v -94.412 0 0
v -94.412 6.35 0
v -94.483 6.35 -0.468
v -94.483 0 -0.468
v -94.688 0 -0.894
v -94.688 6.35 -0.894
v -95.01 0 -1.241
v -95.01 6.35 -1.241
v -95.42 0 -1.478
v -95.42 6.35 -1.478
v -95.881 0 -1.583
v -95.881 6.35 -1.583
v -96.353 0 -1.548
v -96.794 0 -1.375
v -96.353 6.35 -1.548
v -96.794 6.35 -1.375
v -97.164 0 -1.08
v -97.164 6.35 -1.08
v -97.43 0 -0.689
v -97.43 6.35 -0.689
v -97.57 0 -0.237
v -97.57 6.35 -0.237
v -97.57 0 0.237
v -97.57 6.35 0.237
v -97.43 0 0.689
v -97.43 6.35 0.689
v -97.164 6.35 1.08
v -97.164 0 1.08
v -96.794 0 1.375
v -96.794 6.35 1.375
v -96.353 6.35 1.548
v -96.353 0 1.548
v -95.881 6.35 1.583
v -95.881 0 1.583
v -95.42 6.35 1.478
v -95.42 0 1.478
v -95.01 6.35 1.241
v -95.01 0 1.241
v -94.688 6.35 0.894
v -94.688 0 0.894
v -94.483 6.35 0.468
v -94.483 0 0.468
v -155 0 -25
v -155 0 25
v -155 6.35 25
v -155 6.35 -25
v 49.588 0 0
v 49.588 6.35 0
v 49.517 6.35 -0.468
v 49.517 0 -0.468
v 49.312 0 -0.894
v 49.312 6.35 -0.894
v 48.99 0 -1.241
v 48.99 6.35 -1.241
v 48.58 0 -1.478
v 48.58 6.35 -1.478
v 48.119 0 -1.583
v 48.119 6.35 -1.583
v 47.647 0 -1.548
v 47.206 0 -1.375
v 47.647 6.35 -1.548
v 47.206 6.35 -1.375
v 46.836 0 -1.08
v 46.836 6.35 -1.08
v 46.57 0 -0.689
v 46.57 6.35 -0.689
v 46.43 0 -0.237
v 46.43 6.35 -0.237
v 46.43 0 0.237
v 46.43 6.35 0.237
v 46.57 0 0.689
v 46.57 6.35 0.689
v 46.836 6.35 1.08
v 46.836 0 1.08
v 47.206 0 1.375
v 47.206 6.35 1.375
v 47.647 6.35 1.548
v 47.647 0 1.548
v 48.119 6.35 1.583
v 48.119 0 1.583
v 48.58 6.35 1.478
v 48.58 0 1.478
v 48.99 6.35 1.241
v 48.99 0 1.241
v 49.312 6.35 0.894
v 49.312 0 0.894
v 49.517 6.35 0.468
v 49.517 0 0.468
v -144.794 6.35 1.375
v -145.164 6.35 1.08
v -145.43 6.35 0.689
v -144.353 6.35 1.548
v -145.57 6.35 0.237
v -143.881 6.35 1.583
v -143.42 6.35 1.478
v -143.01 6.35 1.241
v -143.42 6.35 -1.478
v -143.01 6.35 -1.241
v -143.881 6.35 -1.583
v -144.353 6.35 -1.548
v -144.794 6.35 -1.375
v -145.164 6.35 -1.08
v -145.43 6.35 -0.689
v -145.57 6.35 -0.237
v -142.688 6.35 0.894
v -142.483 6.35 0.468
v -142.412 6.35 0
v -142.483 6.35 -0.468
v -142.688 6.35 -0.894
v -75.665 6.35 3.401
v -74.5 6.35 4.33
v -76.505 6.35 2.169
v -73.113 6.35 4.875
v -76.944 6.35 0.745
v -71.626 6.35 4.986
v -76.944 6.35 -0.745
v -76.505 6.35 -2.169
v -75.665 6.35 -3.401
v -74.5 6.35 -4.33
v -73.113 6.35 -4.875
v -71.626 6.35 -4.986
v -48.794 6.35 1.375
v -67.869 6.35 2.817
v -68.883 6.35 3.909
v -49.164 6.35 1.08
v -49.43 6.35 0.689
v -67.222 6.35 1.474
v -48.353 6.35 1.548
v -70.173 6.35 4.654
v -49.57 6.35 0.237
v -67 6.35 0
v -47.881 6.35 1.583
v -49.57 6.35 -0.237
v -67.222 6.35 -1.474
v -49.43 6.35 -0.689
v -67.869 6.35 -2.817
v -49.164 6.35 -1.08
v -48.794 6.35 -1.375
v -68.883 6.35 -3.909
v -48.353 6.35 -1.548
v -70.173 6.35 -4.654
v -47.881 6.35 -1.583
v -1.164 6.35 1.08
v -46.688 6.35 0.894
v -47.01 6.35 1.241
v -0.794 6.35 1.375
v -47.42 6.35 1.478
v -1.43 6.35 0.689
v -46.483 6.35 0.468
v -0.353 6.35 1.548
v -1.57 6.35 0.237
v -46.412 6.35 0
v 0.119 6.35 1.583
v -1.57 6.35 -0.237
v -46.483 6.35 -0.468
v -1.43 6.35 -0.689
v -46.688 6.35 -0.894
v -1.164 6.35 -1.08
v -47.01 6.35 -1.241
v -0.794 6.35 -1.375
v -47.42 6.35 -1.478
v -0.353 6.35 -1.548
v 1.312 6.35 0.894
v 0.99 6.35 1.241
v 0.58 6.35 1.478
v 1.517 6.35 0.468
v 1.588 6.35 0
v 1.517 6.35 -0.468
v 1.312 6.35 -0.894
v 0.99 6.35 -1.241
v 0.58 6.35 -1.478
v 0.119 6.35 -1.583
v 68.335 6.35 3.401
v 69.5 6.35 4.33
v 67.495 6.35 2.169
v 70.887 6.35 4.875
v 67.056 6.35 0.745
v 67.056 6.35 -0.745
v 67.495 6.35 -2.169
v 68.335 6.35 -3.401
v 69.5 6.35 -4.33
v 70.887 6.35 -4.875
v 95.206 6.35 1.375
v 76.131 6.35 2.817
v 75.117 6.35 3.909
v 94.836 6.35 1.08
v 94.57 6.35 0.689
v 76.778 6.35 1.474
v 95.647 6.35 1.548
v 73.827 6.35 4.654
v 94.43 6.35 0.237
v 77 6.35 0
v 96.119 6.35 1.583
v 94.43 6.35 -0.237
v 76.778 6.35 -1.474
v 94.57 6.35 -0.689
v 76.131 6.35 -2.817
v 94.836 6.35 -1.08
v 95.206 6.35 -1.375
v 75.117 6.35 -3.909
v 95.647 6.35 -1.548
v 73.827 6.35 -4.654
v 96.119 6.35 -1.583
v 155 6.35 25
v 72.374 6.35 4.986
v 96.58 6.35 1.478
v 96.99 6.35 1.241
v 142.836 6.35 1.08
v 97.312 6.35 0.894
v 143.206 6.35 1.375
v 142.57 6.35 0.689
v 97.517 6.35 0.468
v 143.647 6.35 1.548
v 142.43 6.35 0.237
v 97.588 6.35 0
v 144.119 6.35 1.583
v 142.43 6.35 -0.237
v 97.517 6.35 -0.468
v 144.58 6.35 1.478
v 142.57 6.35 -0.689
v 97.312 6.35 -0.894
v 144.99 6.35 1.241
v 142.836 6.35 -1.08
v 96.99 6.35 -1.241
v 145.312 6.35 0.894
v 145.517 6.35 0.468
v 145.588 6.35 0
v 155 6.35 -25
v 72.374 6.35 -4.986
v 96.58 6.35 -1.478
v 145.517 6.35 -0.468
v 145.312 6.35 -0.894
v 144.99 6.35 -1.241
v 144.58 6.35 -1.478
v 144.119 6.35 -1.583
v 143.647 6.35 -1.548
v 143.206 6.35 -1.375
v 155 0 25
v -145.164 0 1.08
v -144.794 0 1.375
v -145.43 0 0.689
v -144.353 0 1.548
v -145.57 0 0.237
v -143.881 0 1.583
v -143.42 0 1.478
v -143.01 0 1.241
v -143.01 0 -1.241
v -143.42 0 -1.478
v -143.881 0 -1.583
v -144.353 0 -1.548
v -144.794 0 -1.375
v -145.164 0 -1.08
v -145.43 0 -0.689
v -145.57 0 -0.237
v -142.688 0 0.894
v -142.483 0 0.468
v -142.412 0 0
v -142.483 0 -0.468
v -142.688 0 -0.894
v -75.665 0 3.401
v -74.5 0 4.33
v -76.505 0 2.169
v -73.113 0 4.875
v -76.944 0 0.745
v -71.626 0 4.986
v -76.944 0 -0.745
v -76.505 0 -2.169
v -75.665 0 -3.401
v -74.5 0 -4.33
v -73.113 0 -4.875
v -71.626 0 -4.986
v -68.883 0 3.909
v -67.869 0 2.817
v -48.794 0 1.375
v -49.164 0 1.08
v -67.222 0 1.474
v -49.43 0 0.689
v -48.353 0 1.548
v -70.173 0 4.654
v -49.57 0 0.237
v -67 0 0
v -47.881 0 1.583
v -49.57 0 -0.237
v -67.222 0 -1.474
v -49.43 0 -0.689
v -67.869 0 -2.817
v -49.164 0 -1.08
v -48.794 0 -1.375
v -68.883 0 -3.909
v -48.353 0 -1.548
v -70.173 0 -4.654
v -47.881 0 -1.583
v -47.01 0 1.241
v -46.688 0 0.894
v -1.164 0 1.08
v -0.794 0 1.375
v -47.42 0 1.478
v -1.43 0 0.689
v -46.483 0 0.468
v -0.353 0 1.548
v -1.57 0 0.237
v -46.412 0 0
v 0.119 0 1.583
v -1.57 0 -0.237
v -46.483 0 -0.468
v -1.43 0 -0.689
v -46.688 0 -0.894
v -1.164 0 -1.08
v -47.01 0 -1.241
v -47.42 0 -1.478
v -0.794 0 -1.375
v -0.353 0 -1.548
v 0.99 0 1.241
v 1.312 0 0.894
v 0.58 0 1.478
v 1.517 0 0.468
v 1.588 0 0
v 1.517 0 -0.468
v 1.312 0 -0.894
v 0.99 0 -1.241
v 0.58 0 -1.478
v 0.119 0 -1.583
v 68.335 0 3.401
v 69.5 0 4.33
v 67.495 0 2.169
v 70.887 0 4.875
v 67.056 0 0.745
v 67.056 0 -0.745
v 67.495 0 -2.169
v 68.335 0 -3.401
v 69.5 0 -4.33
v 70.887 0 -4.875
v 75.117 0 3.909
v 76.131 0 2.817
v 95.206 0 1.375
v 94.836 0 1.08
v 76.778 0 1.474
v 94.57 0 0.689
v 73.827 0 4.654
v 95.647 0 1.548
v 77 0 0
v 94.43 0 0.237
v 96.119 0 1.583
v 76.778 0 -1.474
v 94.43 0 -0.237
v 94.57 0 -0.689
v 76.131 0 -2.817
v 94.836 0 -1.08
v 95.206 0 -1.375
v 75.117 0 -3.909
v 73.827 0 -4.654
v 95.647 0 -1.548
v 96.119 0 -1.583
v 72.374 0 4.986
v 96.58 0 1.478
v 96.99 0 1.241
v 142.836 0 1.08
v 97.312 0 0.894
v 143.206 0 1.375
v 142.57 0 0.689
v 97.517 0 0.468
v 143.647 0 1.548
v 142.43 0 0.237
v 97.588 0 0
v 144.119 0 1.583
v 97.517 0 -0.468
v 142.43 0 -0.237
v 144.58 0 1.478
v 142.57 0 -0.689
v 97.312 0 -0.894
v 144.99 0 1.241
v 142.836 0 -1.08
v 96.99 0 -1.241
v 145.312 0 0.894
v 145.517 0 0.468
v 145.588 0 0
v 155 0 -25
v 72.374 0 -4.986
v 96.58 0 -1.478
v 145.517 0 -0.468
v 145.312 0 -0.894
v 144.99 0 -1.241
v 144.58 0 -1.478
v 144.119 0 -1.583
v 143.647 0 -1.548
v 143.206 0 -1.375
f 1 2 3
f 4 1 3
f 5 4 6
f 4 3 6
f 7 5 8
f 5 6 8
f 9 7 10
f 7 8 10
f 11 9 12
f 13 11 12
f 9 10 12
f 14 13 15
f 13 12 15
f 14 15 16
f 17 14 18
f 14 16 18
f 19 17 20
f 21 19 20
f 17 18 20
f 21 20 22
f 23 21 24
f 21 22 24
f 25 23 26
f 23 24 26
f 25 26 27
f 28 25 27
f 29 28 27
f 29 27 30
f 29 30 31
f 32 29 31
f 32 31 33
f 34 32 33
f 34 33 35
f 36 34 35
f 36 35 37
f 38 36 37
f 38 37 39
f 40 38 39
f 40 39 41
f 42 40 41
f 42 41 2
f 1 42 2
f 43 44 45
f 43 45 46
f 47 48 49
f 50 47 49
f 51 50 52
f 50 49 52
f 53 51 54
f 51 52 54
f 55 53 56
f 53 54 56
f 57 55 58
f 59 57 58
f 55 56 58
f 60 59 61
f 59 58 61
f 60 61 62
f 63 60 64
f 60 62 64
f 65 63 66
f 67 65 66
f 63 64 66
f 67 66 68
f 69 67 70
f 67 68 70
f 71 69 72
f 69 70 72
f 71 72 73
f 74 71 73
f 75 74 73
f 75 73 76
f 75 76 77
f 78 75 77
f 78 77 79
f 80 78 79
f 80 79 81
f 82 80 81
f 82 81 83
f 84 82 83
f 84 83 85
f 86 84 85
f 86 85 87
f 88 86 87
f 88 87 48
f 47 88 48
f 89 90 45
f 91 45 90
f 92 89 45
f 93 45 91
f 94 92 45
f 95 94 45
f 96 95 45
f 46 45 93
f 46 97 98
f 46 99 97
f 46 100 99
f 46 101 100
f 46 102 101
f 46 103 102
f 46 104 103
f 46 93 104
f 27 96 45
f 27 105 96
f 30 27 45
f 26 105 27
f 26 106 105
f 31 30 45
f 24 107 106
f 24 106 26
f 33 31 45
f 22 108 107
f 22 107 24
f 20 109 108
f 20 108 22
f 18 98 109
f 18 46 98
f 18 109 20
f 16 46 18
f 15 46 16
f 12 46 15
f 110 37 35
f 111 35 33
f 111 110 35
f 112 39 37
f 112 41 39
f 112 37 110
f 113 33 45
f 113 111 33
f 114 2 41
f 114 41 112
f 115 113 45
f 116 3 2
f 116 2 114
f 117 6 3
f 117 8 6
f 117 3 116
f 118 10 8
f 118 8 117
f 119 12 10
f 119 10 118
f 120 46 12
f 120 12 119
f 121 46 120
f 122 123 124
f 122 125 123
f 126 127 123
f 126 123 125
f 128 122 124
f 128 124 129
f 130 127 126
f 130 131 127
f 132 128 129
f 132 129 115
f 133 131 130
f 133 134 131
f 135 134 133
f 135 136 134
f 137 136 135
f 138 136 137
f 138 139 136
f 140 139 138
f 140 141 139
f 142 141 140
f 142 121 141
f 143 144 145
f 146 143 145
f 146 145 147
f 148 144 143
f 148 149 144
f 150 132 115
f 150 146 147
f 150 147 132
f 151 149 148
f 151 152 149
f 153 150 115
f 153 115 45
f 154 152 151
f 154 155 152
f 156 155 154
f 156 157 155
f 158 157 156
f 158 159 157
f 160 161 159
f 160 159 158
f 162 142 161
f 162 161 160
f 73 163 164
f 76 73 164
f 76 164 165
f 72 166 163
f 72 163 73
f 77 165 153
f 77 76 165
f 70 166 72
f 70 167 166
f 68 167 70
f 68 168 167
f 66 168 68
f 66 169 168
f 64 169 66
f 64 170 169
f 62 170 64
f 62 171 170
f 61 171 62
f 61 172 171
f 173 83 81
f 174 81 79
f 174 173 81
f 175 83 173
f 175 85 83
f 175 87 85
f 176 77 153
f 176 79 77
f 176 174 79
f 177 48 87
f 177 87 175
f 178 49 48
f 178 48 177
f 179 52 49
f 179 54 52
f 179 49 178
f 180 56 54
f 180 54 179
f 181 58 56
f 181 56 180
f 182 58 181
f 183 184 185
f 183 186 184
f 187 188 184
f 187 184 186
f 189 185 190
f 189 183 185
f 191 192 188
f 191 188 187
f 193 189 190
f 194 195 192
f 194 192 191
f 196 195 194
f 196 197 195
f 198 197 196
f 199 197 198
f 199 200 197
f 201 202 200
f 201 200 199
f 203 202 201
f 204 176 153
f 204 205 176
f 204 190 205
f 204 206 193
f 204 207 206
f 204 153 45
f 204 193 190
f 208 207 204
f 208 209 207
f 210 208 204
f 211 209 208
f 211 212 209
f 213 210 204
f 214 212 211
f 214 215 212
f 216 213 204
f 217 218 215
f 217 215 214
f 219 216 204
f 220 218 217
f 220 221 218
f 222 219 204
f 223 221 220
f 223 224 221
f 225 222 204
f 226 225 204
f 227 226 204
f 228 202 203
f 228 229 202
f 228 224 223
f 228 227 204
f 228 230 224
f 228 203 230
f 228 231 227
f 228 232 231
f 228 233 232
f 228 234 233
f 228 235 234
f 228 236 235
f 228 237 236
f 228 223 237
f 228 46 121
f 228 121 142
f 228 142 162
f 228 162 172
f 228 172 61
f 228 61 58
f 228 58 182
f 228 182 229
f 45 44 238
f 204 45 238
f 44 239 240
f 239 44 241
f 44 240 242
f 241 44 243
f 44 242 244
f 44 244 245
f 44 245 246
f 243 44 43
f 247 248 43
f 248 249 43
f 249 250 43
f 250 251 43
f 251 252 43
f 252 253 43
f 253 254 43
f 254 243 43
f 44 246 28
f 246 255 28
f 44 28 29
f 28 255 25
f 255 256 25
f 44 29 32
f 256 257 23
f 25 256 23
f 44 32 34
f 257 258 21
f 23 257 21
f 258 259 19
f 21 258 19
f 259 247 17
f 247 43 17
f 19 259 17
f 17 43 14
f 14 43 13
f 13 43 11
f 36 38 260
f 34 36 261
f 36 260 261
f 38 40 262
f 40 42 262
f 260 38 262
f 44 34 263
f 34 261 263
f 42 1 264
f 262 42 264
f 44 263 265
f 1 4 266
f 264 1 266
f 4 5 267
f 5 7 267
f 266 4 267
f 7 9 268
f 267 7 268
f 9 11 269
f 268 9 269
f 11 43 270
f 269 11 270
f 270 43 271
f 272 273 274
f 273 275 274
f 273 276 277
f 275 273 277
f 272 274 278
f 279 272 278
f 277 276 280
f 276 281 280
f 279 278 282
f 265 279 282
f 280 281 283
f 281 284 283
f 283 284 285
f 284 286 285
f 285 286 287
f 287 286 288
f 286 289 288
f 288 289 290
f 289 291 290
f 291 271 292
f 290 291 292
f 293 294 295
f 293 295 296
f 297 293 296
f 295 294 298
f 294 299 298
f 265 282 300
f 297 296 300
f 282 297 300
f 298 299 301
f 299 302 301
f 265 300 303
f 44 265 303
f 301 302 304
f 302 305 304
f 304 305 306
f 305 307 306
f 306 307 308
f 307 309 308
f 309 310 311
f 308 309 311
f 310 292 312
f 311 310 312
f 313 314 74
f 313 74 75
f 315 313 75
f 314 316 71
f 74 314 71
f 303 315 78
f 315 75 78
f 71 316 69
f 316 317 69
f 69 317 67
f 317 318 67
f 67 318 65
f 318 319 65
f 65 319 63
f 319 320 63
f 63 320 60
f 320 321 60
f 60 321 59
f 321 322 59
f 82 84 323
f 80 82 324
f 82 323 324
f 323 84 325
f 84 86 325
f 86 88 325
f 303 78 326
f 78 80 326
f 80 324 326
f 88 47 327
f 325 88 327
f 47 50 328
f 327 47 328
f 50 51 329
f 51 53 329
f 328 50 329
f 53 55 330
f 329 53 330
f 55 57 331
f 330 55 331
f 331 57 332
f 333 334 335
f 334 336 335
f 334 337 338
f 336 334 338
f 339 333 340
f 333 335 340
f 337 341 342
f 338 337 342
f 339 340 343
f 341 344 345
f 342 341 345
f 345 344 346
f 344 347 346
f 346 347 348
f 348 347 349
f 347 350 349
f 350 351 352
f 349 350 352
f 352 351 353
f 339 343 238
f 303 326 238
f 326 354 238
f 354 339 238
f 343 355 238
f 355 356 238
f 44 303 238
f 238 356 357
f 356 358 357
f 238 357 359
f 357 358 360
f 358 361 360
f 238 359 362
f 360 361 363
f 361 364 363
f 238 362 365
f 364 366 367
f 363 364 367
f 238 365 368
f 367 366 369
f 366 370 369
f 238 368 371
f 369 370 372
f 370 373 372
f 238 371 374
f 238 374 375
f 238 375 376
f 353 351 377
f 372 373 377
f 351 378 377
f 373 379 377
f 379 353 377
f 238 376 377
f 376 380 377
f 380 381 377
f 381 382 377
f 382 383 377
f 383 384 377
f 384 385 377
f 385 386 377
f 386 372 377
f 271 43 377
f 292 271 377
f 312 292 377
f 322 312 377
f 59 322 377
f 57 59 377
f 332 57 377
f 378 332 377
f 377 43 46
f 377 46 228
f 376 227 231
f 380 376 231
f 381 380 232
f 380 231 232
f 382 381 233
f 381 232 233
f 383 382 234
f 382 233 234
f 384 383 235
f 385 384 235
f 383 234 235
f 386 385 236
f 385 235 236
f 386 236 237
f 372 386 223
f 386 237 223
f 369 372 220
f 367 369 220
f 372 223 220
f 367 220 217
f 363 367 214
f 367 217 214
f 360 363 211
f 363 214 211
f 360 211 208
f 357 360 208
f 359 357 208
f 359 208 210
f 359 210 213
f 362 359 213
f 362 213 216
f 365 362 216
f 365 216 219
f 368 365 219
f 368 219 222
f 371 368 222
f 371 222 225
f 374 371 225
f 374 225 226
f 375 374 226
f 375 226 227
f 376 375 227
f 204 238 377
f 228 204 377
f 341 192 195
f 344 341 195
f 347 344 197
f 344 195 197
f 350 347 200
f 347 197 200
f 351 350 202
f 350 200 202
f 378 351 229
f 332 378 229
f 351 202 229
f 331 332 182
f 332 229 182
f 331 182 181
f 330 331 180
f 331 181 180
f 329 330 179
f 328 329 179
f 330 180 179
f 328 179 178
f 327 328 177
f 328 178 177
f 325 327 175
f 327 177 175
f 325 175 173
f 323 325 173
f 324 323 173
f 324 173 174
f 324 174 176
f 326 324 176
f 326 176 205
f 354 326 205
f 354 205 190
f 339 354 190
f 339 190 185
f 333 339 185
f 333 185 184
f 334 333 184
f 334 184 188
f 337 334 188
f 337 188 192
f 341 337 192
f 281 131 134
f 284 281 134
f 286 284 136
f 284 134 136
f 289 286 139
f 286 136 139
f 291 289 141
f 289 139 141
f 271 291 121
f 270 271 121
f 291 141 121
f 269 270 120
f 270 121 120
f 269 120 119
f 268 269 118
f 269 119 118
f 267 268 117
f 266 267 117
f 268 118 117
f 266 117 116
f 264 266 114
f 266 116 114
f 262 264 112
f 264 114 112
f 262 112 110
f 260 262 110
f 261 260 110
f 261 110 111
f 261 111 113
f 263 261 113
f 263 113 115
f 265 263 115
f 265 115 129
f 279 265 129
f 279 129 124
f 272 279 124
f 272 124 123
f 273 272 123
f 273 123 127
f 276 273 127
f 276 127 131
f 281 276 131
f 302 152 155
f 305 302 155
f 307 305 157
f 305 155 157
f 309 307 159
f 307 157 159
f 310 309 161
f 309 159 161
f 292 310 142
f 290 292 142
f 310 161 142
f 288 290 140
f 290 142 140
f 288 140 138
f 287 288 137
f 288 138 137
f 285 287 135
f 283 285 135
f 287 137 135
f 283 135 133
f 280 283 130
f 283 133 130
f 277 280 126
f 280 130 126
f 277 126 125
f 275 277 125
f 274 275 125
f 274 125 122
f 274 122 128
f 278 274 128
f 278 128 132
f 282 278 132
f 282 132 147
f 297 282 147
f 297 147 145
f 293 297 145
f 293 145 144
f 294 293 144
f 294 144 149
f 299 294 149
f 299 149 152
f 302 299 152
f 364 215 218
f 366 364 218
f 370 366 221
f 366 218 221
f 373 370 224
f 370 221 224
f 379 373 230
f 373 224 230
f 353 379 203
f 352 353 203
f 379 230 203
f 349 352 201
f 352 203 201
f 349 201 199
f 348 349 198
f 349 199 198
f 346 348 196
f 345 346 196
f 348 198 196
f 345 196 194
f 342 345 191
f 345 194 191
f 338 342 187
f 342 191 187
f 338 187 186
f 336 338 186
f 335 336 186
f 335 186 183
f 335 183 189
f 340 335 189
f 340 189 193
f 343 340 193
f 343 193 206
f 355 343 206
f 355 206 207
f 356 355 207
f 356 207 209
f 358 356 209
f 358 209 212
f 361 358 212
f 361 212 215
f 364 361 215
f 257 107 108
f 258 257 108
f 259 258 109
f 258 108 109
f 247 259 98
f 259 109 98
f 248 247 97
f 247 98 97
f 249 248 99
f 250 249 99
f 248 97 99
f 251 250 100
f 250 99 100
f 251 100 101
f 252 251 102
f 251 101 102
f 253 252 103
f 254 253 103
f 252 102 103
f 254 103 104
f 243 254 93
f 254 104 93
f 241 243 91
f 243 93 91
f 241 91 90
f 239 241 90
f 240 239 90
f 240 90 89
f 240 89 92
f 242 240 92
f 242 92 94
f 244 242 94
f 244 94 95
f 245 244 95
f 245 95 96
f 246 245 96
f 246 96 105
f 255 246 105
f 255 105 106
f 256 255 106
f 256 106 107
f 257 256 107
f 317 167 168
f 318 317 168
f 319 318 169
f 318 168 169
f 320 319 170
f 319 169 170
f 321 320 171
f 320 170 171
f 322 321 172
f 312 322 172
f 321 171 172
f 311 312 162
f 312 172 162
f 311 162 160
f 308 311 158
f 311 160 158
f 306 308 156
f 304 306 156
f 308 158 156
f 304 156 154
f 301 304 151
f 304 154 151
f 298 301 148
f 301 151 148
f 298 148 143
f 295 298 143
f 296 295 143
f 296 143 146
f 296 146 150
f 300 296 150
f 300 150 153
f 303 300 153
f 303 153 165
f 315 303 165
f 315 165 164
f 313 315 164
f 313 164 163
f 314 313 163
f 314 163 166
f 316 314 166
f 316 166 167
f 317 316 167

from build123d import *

# Parameters (mm, degrees)
CROQUIS1_W              = 310
CROQUIS1_H              = 50
SALIENTE_EXTRUIR1_DEPTH = 6.35
CROQUIS2_R              = 1.5875
CROQUIS2_R_2            = 5
CORTAR_EXTRUIR3_DEPTH   = 7.35


with BuildPart() as part:
    # Croquis1 → Saliente-Extruir1 (new body)
    with BuildSketch(Plane(origin=(0, 0, 0), x_dir=(1, 0, 0), z_dir=(0, 1, 0))):
        Rectangle(CROQUIS1_W, CROQUIS1_H)
    extrude(amount=SALIENTE_EXTRUIR1_DEPTH)

    # Croquis2 → Cortar-Extruir3 (cut, through all)
    with BuildSketch(Plane(origin=(0, 6.35, 0), x_dir=(1, 0, 0), z_dir=(0, 1, 0))):
        Circle(CROQUIS2_R)
        with Locations((-144, 0)):
            Circle(CROQUIS2_R)
        with Locations((144, 0)):
            Circle(CROQUIS2_R)
        with Locations((48, 0)):
            Circle(CROQUIS2_R)
        with Locations((96, 0)):
            Circle(CROQUIS2_R)
        with Locations((-48, 0)):
            Circle(CROQUIS2_R)
        with Locations((-96, 0)):
            Circle(CROQUIS2_R)
        with Locations((-72, 0)):
            Circle(CROQUIS2_R_2)
        with Locations((72, 0)):
            Circle(CROQUIS2_R_2)
    extrude(amount=-CORTAR_EXTRUIR3_DEPTH, mode=Mode.SUBTRACT)


solid = part.part
